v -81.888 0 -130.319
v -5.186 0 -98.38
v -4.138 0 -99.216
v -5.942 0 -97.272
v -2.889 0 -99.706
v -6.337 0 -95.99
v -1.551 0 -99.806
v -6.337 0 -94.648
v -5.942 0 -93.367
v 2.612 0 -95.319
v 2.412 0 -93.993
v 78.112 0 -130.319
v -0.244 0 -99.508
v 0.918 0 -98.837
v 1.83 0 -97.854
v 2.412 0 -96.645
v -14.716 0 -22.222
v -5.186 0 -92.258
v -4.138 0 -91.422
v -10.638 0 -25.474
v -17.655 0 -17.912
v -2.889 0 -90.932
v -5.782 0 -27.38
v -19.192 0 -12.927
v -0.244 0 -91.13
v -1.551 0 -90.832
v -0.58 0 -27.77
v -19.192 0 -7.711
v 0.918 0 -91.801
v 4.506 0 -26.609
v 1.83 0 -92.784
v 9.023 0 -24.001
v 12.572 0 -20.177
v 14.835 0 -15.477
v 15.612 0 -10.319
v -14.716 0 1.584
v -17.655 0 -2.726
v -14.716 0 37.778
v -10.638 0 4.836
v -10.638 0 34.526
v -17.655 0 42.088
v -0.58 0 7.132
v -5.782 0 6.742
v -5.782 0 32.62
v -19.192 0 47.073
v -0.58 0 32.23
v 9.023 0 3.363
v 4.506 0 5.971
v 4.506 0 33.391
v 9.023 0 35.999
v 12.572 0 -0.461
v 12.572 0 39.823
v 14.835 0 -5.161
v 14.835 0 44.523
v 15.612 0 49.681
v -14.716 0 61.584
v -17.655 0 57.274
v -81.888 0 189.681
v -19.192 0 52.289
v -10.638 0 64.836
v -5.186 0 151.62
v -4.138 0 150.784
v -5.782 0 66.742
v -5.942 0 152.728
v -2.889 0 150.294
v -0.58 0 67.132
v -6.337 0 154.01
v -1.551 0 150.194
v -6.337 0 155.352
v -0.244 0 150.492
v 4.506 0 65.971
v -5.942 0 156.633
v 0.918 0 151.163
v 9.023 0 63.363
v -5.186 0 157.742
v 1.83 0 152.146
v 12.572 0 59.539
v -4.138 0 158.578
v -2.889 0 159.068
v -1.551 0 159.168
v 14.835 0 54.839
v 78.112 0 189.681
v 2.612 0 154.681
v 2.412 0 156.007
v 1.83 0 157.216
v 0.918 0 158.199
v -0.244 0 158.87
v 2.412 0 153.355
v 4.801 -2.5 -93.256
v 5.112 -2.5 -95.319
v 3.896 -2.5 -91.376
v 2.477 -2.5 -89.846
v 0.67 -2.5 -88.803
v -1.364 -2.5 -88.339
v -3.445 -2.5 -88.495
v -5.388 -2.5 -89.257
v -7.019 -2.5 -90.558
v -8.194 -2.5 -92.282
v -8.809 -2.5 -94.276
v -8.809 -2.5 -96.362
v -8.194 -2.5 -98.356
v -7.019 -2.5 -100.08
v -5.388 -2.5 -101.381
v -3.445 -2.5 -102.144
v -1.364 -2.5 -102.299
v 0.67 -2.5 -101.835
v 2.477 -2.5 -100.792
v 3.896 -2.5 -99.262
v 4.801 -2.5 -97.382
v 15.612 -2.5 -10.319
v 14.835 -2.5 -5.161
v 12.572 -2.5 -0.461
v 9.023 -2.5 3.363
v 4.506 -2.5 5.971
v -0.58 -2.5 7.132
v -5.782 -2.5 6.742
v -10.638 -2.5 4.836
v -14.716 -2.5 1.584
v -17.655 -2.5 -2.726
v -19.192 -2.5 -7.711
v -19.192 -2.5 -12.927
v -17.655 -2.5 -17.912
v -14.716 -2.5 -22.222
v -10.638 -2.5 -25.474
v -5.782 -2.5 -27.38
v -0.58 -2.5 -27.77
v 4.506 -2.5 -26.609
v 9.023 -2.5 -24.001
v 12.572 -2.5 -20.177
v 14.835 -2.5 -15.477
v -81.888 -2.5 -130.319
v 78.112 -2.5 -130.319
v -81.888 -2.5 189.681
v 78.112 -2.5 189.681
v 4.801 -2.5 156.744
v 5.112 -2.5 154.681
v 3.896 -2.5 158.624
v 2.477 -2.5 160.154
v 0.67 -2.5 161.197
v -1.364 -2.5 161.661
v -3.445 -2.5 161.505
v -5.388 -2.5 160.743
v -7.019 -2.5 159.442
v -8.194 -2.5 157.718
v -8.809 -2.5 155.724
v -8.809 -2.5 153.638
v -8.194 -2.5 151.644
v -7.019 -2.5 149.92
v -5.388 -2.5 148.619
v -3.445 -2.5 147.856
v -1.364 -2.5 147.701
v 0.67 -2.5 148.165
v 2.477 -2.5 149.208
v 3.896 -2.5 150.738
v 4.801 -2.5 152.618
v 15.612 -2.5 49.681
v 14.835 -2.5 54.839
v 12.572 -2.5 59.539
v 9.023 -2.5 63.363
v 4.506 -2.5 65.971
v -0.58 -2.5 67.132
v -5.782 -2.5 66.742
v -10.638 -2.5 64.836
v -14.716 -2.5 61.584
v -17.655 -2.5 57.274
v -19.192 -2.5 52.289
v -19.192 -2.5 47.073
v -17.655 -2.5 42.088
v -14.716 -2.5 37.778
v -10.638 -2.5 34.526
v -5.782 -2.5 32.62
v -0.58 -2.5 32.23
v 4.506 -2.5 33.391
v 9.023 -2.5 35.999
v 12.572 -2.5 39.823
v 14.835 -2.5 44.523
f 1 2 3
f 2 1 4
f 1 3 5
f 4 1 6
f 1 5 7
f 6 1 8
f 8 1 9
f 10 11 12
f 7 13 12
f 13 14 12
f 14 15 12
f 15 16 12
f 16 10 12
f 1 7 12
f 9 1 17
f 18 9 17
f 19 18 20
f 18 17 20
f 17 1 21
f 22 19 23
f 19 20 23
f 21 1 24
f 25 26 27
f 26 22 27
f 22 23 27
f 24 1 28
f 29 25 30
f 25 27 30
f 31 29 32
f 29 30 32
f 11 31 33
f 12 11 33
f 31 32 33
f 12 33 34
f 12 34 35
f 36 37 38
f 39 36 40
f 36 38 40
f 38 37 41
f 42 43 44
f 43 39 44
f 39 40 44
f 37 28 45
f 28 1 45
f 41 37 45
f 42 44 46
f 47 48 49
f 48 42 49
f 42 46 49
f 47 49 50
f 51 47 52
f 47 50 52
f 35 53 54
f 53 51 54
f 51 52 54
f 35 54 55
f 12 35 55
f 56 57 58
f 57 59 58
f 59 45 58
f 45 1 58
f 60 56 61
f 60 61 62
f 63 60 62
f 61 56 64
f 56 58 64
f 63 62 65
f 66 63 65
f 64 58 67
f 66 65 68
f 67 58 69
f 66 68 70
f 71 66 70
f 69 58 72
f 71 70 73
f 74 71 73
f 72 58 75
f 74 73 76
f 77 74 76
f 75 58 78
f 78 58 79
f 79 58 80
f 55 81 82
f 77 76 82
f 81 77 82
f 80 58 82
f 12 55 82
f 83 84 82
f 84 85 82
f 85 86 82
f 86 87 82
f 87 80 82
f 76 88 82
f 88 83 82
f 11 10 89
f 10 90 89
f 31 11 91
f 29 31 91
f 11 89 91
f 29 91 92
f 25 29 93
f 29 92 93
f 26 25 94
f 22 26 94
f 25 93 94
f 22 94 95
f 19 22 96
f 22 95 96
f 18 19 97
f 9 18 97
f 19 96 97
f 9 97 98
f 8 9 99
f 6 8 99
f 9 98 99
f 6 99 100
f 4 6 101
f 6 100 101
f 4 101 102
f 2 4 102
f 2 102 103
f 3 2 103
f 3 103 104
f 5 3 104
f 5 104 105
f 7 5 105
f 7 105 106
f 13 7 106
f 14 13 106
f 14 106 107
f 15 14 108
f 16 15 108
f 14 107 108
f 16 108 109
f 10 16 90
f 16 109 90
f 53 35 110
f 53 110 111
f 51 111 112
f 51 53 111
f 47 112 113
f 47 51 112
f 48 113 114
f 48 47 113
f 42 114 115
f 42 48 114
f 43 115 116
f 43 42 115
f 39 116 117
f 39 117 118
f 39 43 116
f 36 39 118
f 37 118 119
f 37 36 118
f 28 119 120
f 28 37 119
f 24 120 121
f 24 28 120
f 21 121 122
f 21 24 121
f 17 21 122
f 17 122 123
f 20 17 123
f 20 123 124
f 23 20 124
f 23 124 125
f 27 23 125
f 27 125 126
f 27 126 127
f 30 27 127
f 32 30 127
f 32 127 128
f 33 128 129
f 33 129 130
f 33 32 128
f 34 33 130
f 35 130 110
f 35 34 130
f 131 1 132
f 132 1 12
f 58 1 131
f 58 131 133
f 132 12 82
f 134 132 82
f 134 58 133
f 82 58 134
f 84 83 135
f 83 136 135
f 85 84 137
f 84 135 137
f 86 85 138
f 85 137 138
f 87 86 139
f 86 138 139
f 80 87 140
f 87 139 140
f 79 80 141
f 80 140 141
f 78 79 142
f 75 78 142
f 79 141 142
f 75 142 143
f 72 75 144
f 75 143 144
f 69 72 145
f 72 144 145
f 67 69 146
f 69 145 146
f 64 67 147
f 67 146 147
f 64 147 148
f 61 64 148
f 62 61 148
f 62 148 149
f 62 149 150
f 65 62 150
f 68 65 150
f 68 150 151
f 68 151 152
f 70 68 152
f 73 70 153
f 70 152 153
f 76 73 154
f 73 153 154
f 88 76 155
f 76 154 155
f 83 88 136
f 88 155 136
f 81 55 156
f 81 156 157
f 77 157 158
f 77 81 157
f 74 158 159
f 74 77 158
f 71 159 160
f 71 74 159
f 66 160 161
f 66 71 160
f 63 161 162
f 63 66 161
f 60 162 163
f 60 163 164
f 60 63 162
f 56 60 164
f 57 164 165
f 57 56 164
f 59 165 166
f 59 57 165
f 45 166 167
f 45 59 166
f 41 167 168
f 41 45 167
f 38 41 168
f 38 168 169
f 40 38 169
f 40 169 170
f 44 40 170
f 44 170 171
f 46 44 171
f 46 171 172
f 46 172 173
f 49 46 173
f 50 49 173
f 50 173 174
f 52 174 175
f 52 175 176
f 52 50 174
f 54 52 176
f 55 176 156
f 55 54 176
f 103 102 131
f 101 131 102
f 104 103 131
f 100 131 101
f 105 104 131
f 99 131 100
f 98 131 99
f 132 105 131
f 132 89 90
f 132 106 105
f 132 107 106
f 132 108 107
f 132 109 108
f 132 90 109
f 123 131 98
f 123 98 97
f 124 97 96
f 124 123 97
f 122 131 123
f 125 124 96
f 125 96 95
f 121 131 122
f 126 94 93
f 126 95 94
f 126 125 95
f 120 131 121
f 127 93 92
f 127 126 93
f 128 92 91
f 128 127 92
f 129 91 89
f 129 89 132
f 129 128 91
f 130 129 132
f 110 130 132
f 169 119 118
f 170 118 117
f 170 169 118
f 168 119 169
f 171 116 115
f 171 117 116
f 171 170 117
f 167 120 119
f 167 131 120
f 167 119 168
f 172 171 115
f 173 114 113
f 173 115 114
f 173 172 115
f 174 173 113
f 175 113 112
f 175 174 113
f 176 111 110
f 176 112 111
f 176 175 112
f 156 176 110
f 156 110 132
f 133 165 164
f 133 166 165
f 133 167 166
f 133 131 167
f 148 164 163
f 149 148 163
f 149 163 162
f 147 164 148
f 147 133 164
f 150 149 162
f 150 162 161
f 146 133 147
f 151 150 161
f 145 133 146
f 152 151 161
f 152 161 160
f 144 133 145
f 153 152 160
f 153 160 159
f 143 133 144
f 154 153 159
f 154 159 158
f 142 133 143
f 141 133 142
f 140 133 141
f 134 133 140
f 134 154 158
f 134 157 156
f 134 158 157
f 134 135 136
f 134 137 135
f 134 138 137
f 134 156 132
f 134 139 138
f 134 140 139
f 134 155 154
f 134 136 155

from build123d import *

# Parameters (mm, degrees)
F0_W     = 160
F0_H     = 320
F0_R     = 3
F0_R_2   = 17.5
F1_DEPTH = 2.5


# Not quite as in the source:
# - a fillet or chamfer that OpenCascade refuses, or shapes differently, is made with other operations: its cross-section is extruded or revolved along the edge and cut away or added


with BuildPart() as f1:
    # F0 (on Front) → F1 (new body)
    with BuildSketch(Plane.XZ):
        with Locations((-1.8876045942, 29.6809725389)):
            Rectangle(F0_W, F0_H)
        with Locations((-1.8876045942, -95.3190274611)):
            Circle(F0_R, mode=Mode.SUBTRACT)
        with Locations((-1.8876045942, -10.3190274611)):
            Circle(F0_R_2, mode=Mode.SUBTRACT)
        with Locations((-1.8876045942, 49.6809725389)):
            Circle(F0_R_2, mode=Mode.SUBTRACT)
        with Locations((-1.8876045942, 154.6809725389)):
            Circle(F0_R, mode=Mode.SUBTRACT)
    extrude(amount=F1_DEPTH)

    # F2: chamfer of 4 on 2 edges, made by hand

    # F2_s1 → F2_t2 (revolve, cut)
    with BuildSketch(Plane.XY.offset(154.6809725389)):
        Polygon((1.1123954058, 1.5), (5.1123954058, -2.5), (1.1123954058, -2.5), align=None)
    revolve(axis=Axis((-1.8876045942, -2.5, 154.6809725389), (0, -1, 0)), mode=Mode.SUBTRACT)

    # F2_s3 → F2_t4 (revolve, cut)
    with BuildSketch(Plane.XY.offset(-95.3190274611)):
        Polygon((1.1123954058, 1.5), (5.1123954058, -2.5), (1.1123954058, -2.5), align=None)
    revolve(axis=Axis((-1.8876045942, -2.5, -95.3190274611), (0, -1, 0)), mode=Mode.SUBTRACT)


solid = f1.part
